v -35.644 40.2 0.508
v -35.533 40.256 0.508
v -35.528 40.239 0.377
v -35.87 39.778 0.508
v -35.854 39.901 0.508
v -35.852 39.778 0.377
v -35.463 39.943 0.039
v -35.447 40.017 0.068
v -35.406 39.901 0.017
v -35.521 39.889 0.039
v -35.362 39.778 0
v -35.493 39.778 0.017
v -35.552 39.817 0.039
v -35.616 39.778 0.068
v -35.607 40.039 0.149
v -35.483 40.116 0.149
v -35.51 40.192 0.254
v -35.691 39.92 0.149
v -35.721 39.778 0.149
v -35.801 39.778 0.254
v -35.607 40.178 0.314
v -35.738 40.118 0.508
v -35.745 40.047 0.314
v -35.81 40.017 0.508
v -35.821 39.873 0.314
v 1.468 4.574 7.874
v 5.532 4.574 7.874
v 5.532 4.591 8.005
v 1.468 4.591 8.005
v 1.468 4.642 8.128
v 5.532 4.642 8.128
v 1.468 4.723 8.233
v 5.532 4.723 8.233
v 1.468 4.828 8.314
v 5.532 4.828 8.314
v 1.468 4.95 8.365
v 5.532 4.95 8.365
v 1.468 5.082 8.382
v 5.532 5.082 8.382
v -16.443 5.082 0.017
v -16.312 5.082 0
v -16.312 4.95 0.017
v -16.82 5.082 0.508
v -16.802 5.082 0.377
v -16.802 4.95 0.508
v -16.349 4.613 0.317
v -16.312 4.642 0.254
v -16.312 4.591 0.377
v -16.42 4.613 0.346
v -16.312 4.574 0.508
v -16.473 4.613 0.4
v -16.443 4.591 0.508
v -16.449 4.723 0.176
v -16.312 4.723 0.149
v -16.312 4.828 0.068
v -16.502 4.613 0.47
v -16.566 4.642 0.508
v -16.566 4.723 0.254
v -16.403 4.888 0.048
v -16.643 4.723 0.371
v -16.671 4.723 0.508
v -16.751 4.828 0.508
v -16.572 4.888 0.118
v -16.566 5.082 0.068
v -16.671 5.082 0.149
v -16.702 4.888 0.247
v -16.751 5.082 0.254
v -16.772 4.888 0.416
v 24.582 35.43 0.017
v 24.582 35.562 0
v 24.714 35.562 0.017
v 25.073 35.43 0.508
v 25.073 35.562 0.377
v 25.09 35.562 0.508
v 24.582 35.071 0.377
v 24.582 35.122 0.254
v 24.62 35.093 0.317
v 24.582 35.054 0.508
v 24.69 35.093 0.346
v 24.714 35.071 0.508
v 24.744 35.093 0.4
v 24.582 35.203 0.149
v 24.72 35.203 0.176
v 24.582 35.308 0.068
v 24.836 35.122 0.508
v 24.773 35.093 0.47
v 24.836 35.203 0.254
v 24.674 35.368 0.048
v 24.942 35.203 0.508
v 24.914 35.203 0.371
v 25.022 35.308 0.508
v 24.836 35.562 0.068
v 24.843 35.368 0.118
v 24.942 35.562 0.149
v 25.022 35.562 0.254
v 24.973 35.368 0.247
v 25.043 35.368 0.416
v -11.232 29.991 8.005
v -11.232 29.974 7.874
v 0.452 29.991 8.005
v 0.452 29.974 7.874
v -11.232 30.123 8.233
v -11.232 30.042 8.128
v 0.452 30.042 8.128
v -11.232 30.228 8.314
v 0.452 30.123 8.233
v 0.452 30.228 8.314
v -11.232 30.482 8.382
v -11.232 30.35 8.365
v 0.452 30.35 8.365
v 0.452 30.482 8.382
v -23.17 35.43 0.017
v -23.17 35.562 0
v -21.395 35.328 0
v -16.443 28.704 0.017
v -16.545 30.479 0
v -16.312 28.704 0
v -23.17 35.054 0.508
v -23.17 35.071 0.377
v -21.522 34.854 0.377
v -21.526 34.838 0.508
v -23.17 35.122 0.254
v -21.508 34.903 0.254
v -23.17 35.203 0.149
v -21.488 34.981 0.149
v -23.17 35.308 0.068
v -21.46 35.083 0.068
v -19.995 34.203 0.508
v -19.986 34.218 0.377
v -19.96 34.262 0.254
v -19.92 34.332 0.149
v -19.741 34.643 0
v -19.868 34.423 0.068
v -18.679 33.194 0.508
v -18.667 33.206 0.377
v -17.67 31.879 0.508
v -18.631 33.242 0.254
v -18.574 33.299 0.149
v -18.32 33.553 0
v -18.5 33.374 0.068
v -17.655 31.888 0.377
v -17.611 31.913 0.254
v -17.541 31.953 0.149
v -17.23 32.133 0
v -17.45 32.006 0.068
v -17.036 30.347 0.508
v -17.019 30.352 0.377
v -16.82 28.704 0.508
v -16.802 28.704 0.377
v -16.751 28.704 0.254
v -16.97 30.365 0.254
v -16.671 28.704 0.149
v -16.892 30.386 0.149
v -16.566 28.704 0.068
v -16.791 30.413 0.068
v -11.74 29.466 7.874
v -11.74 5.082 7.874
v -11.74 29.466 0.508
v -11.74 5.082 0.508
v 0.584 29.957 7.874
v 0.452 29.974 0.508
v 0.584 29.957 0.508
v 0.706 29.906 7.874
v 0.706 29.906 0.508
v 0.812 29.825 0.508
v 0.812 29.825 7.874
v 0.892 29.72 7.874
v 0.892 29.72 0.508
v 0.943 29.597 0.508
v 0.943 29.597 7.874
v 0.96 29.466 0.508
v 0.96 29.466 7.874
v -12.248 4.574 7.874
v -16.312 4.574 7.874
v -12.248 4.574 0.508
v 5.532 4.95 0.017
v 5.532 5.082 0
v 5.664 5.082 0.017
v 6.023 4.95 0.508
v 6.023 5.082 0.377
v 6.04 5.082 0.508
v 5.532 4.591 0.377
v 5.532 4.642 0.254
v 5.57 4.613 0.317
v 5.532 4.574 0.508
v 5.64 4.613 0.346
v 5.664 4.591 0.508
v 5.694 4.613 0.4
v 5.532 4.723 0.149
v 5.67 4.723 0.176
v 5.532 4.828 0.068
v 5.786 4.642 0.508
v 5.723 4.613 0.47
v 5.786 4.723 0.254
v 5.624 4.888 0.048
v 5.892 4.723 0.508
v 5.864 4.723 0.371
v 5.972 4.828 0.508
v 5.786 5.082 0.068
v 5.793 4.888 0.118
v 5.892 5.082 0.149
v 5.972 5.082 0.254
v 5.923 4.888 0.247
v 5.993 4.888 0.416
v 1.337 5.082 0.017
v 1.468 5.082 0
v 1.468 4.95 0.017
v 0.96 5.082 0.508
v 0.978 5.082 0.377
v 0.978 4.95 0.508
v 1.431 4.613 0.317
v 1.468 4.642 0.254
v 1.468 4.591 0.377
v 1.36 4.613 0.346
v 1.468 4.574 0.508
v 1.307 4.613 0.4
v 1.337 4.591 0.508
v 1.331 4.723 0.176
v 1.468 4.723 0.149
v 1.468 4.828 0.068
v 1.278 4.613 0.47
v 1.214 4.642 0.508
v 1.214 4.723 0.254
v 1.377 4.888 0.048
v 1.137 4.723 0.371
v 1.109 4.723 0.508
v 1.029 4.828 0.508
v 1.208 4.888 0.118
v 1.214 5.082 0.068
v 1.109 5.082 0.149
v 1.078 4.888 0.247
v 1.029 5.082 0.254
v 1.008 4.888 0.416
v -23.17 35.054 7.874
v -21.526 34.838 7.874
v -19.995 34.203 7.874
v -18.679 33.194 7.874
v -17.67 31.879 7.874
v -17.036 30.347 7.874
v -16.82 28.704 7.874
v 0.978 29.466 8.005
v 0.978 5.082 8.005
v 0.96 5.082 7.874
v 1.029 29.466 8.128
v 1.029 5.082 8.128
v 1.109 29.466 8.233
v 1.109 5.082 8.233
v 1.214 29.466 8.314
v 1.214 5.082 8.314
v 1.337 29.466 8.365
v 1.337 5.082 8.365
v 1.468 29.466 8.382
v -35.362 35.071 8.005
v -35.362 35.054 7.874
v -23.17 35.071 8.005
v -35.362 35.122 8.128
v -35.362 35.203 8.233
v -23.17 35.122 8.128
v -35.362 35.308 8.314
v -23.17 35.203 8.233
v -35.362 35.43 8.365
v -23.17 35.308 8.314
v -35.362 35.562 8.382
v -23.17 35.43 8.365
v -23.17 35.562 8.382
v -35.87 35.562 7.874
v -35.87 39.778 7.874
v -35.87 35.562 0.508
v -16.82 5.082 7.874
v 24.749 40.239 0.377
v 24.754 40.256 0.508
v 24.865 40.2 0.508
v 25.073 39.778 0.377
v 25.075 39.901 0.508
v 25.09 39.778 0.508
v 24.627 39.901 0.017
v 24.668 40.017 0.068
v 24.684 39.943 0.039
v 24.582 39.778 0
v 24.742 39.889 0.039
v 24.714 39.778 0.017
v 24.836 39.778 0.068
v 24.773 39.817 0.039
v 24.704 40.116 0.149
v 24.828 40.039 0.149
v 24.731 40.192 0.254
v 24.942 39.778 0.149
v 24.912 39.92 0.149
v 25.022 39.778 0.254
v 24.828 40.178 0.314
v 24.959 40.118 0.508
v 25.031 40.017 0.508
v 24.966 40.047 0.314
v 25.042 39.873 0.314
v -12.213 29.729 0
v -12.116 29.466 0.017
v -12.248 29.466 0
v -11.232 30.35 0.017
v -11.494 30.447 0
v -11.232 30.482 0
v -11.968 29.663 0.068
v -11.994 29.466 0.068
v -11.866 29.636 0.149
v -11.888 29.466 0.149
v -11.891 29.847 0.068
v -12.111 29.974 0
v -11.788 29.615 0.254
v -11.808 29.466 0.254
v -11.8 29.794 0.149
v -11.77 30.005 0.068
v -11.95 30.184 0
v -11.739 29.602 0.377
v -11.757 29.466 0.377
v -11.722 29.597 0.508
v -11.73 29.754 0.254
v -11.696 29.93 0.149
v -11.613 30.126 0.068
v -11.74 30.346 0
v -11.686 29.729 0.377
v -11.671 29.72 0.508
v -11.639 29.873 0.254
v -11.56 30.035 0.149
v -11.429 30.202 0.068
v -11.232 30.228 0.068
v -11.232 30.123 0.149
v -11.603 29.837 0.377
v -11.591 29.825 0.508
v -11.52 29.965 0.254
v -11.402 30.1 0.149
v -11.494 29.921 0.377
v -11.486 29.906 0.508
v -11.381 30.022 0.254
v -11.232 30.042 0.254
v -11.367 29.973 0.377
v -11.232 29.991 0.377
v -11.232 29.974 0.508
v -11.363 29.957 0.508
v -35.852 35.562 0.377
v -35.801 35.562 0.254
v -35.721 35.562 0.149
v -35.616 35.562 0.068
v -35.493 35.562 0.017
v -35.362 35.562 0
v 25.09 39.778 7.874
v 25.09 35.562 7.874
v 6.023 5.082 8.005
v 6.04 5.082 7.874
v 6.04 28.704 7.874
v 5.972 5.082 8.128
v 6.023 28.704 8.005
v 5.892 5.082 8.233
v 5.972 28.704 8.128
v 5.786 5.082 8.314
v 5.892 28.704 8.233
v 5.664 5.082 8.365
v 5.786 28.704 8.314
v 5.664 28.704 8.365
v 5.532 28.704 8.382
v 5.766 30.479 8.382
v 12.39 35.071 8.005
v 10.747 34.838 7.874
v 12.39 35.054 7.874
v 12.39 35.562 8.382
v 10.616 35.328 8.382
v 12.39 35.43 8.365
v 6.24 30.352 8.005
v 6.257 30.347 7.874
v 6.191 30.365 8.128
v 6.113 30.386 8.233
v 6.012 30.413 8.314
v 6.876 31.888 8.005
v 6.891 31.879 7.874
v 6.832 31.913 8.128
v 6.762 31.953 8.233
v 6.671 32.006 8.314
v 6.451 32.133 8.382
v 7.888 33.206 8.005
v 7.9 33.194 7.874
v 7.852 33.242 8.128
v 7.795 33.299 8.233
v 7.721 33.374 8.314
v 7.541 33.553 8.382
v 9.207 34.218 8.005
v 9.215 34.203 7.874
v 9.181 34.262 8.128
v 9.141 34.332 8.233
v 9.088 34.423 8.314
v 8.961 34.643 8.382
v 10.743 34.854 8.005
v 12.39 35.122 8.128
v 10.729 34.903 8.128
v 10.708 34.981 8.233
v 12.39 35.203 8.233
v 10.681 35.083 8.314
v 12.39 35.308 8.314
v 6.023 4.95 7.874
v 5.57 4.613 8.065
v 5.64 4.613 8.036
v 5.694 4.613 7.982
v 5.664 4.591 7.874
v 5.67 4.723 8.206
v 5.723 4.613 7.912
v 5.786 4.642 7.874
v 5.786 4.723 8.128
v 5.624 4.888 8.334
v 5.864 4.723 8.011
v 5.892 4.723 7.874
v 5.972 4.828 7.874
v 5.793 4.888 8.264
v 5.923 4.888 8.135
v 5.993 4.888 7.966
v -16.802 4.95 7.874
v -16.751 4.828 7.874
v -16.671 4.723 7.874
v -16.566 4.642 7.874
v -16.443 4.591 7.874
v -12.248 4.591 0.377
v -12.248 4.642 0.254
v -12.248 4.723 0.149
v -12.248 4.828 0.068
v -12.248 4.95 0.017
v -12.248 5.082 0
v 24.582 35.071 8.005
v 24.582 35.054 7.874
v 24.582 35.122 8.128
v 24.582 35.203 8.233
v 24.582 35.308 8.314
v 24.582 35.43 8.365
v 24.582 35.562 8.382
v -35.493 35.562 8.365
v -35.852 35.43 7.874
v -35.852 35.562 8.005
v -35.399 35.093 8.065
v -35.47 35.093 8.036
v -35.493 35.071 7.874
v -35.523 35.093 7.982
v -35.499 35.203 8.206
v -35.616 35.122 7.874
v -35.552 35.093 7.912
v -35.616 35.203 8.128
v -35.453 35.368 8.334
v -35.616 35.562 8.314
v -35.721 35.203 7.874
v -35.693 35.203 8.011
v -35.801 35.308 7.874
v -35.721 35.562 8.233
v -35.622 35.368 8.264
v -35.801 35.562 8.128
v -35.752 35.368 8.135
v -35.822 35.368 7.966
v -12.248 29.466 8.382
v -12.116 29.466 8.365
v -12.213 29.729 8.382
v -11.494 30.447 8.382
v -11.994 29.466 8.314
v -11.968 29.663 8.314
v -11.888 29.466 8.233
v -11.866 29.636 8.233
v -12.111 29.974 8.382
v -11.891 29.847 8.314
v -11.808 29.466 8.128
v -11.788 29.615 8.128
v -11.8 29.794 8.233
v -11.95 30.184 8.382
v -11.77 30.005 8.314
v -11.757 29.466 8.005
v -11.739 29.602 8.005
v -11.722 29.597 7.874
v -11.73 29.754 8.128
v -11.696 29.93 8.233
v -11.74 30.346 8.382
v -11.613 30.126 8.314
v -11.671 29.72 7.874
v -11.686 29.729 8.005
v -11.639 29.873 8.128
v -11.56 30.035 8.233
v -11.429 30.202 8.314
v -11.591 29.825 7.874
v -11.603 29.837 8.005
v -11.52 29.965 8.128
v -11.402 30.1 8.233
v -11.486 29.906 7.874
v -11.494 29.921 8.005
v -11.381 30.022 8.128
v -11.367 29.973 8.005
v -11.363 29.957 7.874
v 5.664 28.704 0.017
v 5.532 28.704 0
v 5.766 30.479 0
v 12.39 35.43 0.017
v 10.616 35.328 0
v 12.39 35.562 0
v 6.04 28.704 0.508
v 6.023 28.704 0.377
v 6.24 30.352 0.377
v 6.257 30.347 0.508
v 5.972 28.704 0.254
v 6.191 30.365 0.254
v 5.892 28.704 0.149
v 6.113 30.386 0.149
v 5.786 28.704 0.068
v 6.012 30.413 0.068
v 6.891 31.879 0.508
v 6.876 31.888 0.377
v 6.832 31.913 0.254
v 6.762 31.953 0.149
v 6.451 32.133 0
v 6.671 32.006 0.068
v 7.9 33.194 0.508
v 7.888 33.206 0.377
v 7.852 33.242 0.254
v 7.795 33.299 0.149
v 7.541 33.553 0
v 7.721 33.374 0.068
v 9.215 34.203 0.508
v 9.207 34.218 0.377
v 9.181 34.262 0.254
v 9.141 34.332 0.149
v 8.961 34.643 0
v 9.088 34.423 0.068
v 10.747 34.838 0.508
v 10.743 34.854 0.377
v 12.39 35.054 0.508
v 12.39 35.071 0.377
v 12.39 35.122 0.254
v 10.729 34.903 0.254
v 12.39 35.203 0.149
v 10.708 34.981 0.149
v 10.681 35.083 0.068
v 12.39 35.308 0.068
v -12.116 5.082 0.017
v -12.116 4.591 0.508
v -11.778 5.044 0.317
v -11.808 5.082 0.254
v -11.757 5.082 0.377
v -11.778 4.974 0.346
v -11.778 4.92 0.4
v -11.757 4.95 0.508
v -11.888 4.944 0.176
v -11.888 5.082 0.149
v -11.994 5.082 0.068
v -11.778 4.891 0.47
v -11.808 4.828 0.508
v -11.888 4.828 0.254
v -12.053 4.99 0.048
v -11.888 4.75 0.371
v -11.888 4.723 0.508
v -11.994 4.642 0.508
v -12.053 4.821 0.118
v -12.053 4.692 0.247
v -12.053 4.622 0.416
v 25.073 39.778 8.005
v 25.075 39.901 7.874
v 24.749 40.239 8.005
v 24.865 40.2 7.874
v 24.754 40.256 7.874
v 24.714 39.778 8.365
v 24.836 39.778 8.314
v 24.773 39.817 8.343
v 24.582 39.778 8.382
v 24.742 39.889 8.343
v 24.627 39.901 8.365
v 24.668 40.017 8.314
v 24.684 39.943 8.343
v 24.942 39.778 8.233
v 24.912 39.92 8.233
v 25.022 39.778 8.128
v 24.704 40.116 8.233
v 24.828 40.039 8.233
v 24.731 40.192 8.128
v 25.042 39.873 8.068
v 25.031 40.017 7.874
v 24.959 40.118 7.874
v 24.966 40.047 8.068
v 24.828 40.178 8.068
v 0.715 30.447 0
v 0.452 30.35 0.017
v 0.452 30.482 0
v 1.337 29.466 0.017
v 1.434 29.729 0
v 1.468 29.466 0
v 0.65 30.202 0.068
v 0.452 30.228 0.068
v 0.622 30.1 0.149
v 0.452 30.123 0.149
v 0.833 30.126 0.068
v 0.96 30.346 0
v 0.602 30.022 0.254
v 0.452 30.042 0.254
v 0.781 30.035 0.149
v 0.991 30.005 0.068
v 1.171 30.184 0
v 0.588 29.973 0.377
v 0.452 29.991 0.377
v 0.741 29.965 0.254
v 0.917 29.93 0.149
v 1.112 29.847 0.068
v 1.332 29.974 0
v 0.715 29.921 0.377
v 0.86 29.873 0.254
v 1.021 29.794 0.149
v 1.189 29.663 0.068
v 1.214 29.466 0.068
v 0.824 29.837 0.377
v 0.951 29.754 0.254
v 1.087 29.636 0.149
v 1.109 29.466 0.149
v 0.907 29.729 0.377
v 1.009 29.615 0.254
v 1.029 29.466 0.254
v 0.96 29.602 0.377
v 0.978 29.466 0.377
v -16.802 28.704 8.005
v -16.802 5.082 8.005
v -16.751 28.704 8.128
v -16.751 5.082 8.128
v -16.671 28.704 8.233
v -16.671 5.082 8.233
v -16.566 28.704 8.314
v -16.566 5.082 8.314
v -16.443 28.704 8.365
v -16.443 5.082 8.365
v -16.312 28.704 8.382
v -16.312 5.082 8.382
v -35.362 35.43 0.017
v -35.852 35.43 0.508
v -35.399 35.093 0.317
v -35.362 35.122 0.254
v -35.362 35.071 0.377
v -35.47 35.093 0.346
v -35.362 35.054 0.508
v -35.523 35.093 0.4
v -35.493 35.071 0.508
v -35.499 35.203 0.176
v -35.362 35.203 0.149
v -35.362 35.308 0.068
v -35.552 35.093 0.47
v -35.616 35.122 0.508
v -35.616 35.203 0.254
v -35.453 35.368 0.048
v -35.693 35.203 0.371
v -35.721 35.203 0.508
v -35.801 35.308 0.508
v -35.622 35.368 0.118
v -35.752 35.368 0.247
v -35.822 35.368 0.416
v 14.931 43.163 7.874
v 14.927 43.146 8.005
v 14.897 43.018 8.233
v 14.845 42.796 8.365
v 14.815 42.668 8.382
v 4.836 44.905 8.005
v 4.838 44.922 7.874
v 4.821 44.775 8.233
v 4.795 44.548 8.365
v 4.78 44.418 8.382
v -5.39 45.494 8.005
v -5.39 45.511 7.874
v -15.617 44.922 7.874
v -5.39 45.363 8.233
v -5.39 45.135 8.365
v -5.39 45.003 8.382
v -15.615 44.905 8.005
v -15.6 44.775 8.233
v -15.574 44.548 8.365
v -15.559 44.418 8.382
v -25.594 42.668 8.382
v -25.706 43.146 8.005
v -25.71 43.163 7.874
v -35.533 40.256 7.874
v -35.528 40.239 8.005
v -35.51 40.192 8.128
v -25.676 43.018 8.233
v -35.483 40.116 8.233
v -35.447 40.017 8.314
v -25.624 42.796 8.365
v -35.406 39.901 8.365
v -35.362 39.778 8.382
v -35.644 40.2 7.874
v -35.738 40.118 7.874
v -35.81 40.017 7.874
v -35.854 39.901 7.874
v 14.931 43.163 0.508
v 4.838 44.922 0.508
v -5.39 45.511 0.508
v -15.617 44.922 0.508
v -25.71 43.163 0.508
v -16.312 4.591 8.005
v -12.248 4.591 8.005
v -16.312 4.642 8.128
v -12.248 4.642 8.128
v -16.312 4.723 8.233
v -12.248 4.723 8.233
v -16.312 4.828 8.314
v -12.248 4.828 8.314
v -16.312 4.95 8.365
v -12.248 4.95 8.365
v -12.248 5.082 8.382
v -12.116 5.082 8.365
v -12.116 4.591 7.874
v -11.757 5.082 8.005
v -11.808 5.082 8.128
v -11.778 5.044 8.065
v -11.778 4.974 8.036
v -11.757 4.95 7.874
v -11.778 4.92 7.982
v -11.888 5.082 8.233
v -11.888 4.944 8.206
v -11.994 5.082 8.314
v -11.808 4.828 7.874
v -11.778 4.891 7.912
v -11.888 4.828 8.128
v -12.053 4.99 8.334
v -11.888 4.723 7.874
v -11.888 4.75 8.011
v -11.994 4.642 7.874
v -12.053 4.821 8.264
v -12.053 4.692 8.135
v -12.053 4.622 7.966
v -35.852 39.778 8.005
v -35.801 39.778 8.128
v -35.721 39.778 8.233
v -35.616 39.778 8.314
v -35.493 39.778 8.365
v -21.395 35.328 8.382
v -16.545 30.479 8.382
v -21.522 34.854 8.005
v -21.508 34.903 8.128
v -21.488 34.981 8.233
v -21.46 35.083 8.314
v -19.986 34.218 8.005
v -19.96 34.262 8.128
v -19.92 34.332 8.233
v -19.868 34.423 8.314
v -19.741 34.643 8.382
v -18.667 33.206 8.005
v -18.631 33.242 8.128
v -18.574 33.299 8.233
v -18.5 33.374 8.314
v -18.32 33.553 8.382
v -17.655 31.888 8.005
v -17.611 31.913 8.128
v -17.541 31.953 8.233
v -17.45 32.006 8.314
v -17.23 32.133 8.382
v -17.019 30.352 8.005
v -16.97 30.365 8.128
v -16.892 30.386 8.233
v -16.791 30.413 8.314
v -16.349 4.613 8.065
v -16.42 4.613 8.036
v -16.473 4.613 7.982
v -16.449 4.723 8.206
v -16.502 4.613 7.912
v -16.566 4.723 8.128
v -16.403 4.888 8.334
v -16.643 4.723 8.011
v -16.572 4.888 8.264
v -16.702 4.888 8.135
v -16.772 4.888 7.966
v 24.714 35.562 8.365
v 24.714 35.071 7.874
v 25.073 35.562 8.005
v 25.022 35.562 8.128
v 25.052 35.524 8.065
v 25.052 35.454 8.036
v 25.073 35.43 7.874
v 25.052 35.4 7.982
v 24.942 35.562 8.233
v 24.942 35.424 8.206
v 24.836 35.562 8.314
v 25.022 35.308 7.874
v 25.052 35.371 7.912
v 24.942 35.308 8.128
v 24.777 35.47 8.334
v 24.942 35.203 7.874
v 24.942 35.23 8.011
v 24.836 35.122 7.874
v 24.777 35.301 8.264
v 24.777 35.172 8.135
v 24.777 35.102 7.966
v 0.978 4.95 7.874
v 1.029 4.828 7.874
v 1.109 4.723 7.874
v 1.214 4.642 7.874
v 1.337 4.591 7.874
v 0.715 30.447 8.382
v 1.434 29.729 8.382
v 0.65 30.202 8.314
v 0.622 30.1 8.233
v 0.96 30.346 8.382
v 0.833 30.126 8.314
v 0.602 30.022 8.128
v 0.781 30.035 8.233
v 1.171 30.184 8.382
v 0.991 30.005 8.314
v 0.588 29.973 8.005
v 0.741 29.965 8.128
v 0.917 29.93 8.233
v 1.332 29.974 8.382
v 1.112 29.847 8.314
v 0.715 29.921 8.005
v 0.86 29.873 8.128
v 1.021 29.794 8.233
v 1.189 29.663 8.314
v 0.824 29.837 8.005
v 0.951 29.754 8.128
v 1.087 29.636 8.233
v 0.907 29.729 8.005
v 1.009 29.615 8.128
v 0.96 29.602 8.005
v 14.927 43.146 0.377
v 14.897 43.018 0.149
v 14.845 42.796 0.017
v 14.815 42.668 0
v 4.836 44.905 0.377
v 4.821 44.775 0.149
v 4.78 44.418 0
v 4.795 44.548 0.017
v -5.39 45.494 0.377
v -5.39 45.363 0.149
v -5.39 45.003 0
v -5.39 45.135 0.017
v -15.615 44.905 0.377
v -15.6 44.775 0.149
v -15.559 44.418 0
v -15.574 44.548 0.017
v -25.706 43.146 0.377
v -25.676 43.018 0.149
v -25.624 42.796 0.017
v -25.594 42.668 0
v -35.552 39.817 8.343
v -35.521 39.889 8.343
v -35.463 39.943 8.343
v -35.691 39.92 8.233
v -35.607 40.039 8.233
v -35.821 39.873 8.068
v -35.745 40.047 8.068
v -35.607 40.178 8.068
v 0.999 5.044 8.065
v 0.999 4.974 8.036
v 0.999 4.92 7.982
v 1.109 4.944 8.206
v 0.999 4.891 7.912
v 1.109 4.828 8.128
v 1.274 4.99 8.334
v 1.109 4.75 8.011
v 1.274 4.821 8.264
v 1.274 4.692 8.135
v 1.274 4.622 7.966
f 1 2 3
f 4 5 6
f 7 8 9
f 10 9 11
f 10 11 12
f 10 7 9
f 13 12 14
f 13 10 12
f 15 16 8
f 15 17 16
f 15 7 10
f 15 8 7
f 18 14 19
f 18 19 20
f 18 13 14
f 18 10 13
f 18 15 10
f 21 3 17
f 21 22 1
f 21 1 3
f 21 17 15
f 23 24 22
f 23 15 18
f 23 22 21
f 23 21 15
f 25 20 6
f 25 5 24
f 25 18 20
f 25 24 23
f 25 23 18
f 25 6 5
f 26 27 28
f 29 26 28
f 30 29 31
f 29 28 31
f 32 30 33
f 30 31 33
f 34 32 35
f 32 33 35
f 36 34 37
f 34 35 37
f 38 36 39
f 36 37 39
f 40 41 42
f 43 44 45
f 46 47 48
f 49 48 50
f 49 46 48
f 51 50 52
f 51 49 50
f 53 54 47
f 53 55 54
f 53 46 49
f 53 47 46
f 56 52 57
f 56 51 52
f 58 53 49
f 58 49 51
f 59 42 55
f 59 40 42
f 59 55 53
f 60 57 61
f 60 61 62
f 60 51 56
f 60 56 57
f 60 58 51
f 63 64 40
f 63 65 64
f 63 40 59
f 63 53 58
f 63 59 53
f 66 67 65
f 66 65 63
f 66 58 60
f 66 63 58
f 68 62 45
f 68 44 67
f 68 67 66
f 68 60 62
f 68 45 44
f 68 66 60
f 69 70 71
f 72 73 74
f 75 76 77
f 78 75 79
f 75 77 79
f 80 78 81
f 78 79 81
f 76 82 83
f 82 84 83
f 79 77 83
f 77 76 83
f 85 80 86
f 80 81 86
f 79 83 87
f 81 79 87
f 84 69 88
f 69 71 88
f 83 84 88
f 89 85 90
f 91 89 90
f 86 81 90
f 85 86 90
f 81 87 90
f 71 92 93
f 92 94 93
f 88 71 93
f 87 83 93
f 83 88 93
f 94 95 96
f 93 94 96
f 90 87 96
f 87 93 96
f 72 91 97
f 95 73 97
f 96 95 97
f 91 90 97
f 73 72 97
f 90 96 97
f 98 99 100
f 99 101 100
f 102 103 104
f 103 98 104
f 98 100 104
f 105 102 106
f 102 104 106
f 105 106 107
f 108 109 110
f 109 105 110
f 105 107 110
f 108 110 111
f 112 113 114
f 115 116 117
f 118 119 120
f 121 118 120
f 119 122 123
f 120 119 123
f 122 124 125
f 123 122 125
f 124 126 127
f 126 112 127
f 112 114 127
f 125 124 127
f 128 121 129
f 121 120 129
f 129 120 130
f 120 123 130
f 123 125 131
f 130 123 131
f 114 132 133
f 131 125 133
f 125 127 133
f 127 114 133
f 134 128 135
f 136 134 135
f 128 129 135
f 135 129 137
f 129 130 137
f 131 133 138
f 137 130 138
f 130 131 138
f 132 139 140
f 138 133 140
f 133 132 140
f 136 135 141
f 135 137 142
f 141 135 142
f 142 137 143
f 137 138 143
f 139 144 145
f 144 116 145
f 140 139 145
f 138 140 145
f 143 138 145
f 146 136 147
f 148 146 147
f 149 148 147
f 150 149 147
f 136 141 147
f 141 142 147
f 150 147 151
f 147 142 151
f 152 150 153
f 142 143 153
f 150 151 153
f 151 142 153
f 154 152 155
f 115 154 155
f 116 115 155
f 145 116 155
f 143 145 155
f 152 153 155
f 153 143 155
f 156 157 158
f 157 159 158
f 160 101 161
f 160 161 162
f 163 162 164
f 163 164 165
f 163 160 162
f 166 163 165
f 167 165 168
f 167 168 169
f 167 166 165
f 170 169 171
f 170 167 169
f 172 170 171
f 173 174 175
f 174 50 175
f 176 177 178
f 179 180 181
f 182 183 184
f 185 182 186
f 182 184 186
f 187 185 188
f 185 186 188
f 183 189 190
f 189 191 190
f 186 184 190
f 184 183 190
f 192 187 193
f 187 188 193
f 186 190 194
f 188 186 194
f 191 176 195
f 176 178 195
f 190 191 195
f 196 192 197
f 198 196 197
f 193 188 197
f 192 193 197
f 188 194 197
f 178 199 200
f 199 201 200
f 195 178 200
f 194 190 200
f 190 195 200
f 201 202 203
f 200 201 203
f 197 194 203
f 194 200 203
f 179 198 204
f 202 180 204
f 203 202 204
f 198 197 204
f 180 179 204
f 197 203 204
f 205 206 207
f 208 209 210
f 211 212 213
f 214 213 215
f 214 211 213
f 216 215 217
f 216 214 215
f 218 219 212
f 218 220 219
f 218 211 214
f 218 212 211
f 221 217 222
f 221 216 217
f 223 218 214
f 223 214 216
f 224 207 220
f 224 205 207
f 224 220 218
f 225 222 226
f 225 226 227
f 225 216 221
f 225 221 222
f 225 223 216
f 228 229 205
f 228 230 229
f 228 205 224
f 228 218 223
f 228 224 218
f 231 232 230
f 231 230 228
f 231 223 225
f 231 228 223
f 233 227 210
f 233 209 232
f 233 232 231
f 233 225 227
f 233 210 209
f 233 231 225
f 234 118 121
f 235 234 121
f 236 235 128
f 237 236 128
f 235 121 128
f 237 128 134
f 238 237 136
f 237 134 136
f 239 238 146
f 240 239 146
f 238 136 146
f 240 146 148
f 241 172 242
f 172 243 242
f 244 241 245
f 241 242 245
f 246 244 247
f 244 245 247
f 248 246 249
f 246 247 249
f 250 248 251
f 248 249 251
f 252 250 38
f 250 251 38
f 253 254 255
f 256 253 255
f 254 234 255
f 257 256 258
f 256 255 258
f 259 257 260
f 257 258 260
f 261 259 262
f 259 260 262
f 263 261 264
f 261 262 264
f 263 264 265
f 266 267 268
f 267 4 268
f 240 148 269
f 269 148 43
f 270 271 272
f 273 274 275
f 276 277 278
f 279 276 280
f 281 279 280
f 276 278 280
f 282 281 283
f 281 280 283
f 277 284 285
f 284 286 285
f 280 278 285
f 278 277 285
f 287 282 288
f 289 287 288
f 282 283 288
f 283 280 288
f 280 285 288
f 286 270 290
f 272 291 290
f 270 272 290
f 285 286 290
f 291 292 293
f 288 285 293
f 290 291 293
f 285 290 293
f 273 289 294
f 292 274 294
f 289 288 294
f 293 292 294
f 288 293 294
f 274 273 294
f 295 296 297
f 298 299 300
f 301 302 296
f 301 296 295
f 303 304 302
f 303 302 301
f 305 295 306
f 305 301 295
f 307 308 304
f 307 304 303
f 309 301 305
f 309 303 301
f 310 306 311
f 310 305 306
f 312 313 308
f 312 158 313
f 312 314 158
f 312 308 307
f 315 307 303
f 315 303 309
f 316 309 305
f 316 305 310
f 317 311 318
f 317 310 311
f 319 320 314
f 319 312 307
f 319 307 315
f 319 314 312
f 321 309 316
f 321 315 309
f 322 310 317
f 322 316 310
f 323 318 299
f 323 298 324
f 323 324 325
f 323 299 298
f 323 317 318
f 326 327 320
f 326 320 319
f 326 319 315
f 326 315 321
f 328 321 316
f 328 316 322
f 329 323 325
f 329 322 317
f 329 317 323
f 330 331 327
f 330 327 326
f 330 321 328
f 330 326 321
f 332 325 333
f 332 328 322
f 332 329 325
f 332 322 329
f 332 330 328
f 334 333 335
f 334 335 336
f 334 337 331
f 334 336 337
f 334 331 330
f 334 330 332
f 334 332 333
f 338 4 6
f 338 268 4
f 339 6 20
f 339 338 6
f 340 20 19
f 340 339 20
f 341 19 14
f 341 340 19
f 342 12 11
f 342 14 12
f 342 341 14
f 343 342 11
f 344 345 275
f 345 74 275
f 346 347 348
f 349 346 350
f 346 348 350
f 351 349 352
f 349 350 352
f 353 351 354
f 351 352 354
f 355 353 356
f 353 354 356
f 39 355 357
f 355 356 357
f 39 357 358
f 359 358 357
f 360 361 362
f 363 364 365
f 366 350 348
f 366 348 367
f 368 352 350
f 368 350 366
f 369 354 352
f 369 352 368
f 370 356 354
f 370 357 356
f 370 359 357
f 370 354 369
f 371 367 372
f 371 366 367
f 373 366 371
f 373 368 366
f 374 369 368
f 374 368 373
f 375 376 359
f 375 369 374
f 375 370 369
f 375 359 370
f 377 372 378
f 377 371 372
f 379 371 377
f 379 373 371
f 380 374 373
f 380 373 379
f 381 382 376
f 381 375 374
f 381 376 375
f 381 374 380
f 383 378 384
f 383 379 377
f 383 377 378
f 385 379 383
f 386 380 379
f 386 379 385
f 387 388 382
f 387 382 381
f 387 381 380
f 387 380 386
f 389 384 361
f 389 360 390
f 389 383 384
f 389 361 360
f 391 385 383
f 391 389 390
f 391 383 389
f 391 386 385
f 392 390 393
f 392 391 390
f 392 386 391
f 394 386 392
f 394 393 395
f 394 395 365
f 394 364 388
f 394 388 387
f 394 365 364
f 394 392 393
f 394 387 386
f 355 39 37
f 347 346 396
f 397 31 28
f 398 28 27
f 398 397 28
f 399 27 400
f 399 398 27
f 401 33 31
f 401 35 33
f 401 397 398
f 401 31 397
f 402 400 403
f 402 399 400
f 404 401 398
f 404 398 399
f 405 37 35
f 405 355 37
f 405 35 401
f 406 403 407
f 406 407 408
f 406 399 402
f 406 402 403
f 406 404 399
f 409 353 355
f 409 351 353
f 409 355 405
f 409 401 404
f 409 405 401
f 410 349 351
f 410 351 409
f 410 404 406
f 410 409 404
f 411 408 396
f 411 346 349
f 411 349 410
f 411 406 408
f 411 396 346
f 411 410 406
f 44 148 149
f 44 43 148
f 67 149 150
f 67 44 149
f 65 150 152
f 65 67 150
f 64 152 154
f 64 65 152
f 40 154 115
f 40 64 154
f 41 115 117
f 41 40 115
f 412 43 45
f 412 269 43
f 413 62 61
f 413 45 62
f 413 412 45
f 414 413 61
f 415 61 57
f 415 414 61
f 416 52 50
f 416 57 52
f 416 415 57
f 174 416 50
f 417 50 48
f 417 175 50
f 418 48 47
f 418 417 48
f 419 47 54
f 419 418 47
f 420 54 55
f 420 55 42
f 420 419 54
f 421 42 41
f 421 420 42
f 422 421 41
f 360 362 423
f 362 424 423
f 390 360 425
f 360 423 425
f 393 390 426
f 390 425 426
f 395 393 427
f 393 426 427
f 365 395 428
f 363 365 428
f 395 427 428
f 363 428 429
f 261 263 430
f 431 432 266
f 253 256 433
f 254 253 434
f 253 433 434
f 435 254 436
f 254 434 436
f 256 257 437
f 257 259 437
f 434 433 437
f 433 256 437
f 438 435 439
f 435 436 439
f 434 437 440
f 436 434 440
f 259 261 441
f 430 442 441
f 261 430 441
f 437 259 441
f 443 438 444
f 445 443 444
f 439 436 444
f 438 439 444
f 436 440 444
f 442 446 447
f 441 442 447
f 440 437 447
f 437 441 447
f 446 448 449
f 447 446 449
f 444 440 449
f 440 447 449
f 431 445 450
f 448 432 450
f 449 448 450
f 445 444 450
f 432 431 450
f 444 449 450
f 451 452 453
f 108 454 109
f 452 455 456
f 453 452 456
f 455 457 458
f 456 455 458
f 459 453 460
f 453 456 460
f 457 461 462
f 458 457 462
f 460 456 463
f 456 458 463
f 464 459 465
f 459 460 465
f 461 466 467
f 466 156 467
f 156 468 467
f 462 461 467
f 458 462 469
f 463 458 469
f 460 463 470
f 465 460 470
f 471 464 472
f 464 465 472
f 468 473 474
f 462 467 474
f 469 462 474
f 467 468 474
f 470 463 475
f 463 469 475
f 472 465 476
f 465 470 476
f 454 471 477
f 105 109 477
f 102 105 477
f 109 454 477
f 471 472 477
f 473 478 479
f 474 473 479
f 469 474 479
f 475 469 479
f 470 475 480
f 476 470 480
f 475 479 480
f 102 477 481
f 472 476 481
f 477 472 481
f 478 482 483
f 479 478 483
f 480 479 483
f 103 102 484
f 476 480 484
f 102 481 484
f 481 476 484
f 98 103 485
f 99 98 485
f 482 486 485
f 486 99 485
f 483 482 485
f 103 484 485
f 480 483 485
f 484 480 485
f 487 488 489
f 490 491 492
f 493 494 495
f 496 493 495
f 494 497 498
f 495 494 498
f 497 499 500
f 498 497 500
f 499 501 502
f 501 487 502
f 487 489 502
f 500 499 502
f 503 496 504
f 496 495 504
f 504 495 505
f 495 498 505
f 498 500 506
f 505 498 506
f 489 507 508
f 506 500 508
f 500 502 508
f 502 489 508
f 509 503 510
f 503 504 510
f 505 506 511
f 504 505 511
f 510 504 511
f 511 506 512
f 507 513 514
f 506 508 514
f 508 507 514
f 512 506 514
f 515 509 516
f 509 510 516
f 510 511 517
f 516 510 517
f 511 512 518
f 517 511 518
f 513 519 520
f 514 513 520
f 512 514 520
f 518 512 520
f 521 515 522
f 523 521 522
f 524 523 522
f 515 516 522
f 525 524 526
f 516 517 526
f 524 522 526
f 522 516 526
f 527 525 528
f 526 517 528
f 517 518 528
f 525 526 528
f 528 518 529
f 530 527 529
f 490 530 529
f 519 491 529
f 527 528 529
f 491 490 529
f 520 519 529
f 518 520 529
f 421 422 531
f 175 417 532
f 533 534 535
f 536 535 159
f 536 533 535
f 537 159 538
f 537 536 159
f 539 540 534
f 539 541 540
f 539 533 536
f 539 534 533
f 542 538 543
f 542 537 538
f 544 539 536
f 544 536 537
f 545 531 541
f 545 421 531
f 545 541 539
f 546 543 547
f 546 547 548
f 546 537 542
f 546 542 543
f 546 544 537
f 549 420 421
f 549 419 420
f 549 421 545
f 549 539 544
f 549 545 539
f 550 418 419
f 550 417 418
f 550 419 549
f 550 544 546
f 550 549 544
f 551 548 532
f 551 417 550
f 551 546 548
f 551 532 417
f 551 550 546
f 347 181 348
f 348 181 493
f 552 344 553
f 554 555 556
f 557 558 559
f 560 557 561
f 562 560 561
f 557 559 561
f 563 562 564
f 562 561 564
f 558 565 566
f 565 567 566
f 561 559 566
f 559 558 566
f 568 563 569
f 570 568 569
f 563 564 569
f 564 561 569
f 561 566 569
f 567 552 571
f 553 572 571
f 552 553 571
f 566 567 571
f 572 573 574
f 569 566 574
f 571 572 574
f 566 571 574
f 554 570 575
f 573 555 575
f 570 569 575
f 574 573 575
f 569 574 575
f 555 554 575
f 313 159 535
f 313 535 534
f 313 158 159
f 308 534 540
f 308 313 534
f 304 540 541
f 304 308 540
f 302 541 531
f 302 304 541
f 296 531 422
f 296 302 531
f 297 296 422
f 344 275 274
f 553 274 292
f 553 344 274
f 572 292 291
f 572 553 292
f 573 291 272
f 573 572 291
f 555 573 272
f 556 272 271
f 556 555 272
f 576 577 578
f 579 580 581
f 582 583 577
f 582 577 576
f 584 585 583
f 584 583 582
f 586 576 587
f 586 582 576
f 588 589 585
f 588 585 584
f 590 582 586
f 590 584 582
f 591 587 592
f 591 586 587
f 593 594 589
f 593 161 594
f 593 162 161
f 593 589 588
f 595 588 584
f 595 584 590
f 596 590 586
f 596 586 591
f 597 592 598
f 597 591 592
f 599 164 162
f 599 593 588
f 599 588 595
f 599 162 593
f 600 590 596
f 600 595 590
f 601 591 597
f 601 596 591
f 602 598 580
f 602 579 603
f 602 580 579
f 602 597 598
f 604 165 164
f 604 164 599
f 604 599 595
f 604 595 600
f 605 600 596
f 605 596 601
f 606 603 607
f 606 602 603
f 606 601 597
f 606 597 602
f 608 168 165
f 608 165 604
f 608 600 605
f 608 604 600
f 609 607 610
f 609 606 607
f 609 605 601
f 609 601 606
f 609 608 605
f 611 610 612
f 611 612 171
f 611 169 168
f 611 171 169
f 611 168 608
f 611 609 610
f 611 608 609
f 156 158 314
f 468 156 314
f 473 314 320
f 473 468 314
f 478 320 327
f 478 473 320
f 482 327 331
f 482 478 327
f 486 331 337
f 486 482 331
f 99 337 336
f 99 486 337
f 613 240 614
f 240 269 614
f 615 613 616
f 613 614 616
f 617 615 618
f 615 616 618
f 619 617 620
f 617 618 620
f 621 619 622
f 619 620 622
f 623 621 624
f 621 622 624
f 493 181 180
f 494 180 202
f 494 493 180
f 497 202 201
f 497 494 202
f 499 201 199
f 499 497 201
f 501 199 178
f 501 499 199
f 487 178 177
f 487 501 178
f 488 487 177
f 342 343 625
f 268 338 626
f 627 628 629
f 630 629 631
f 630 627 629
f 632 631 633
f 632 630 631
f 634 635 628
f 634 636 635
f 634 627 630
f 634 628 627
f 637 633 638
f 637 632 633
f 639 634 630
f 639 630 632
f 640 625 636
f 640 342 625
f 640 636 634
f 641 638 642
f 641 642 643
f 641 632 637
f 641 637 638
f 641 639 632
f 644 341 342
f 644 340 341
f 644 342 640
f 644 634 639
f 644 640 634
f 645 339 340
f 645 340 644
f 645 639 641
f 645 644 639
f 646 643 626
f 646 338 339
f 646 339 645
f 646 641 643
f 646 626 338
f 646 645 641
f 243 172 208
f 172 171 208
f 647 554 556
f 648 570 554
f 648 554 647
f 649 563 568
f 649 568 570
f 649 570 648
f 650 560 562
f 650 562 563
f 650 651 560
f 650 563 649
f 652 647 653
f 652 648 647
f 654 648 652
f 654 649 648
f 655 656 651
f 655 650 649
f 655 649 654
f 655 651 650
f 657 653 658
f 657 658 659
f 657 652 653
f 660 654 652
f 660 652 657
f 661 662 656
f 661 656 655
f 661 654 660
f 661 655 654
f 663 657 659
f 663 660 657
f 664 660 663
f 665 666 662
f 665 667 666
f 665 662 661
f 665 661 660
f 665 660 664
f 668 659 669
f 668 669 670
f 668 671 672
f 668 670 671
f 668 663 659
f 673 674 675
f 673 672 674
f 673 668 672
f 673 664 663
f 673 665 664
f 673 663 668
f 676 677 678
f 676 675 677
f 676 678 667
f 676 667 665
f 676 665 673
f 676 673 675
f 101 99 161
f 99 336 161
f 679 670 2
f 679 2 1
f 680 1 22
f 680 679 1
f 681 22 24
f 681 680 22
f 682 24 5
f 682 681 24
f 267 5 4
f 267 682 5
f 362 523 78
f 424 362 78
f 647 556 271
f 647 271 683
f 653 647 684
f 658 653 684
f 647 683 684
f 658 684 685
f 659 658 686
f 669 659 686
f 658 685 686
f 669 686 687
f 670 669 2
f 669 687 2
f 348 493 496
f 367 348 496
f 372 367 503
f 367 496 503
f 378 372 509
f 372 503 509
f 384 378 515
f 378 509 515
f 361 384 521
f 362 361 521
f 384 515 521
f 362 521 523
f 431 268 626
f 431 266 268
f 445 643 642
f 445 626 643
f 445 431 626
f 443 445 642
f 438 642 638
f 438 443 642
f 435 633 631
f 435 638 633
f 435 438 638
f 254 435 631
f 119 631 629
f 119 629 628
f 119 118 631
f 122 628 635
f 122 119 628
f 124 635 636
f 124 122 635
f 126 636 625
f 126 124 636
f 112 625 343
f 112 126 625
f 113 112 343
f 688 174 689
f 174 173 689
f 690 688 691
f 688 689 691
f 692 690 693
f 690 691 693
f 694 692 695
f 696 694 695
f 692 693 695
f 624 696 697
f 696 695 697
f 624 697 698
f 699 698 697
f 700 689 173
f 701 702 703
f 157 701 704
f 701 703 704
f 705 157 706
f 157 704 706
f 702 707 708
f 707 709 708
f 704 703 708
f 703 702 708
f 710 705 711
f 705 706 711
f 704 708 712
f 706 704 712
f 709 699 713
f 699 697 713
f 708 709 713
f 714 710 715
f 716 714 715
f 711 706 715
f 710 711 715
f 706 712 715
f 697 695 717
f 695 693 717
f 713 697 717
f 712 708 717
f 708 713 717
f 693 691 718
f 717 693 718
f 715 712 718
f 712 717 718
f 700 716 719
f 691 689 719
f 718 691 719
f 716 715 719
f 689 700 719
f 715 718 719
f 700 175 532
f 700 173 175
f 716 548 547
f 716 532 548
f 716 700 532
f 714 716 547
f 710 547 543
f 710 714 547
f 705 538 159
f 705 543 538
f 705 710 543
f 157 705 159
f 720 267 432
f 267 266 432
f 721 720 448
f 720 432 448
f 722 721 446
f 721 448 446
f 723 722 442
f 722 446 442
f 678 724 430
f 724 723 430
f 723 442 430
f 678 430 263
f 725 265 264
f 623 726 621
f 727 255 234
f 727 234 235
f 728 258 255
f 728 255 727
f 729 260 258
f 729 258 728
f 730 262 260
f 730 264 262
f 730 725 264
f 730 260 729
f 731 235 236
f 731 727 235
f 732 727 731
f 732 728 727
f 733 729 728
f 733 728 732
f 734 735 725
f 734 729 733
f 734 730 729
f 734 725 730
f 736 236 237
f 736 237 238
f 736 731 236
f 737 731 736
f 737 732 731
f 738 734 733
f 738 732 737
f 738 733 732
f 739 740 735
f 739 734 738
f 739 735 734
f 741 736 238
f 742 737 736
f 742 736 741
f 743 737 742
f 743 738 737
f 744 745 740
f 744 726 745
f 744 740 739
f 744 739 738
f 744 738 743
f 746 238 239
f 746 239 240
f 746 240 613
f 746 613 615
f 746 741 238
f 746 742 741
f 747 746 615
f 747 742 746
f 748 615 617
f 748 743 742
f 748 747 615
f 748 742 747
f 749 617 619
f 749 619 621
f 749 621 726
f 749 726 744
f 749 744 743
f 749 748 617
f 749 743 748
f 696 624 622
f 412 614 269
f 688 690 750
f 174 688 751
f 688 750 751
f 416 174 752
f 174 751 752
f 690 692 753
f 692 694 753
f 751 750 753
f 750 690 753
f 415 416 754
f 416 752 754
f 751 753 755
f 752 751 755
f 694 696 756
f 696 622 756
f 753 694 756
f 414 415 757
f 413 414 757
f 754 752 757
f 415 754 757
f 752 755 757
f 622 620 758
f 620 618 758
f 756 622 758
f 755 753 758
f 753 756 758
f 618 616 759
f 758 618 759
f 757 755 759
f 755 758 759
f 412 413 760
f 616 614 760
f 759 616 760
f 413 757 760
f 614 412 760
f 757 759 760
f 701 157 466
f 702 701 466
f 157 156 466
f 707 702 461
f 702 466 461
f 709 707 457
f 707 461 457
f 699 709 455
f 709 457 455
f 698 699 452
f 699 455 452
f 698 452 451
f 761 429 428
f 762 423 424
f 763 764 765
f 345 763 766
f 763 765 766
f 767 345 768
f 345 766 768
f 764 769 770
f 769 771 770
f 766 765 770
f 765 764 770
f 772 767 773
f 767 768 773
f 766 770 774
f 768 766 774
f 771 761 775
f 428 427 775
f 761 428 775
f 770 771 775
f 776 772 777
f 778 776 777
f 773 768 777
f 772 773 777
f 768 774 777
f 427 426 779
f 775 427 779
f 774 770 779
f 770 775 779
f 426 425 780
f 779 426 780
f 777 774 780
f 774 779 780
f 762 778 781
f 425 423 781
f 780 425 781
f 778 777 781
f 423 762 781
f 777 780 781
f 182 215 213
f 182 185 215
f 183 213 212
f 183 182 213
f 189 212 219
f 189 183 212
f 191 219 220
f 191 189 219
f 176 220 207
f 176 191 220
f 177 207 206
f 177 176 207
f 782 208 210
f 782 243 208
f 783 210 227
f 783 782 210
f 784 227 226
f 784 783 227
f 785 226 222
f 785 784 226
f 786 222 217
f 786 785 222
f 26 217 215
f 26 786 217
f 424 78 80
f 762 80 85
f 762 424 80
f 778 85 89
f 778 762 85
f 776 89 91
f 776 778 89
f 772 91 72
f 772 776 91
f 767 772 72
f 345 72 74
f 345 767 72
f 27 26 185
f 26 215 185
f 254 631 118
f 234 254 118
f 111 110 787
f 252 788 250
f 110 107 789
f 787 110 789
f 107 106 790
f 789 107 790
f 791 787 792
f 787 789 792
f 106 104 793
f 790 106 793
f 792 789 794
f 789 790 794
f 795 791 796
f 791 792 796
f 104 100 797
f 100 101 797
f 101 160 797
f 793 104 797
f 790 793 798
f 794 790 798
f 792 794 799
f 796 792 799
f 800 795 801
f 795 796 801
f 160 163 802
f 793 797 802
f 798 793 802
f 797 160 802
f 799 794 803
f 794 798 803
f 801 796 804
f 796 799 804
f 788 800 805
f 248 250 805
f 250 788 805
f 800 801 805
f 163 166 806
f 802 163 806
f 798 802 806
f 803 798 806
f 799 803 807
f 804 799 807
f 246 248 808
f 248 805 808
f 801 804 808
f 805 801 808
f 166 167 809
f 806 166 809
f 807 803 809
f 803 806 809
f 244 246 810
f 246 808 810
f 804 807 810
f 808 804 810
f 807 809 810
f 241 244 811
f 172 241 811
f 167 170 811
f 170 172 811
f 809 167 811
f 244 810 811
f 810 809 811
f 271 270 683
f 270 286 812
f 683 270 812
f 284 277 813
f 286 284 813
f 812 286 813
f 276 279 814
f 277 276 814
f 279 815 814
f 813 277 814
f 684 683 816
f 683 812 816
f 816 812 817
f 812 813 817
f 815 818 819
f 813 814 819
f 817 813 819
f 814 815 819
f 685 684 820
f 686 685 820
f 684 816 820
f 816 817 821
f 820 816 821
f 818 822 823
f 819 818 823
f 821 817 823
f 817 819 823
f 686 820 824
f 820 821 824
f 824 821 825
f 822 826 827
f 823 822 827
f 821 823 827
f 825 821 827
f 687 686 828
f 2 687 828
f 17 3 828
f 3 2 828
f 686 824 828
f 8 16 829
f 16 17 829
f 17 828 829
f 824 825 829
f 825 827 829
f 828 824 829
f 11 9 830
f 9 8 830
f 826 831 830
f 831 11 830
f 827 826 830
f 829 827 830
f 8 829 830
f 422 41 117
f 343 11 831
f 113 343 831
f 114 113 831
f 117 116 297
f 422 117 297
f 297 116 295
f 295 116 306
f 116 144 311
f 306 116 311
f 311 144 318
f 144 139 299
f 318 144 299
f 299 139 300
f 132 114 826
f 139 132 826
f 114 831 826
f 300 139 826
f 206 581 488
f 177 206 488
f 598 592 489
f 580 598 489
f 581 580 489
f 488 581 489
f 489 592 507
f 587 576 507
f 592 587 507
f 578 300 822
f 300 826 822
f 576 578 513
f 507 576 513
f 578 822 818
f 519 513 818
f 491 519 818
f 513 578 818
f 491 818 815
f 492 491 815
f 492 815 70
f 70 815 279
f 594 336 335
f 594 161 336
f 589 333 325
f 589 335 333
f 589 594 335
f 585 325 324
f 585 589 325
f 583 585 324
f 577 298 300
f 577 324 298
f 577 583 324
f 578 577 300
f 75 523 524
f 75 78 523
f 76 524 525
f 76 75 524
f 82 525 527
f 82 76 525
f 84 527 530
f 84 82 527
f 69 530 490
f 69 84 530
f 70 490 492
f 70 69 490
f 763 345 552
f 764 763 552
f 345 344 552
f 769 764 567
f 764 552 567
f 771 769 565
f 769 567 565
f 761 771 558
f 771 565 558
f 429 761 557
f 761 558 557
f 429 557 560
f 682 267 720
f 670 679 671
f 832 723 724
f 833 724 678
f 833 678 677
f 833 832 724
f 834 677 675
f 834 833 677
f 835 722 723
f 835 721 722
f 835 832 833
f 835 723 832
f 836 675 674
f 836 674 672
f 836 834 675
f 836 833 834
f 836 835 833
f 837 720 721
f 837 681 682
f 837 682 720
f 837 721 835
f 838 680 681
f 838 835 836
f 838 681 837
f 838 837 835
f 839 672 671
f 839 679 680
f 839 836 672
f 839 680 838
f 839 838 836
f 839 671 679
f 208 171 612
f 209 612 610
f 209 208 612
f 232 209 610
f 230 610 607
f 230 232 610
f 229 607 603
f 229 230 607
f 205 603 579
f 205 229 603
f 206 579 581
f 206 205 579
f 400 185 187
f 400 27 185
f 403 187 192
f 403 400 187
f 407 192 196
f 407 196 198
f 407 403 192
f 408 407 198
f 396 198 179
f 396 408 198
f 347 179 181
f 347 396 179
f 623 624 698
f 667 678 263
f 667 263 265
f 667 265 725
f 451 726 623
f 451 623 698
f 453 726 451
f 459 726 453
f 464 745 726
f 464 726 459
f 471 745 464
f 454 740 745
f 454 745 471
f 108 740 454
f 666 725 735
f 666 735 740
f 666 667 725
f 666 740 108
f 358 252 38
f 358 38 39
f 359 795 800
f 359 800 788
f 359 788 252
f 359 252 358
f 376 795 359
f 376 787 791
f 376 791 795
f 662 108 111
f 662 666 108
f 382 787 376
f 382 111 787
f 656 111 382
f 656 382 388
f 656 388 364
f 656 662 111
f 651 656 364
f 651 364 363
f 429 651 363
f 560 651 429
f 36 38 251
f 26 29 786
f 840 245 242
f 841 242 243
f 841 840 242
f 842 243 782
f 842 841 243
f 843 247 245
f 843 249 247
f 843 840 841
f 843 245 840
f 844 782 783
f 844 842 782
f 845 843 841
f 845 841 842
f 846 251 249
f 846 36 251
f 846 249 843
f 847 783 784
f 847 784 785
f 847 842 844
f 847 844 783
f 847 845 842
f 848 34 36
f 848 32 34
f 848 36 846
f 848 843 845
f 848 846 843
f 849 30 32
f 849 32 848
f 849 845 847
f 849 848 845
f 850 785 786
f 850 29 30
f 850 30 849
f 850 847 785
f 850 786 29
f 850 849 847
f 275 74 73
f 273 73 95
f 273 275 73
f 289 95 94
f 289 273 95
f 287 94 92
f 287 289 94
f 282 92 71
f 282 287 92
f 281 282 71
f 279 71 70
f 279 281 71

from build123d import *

# Parameters (mm, degrees)
F1_DEPTH = 8.382
F2_R     = 0.508


with BuildPart() as f1:
    # F0 (on Top) → F1 (new body)
    with BuildSketch(Plane.XY):
        with BuildLine():
            Line((-16.819511, 28.70391), (-16.819511, 4.57391))
            Line((-16.819511, 4.57391), (-11.739511, 4.57391))
            Line((-11.739511, 4.57391), (-11.739511, 29.97391))
            Line((-11.739511, 29.97391), (0.960489, 29.97391))
            Line((0.960489, 29.97391), (0.960489, 4.57391))
            Line((0.960489, 4.57391), (6.040489, 4.57391))
            Line((6.040489, 4.57391), (6.040489, 28.70391))
            ThreePointArc((6.040489, 28.70391), (7.900361, 33.194038), (12.390489, 35.05391))
            Line((12.390489, 35.05391), (25.090489, 35.05391))
            Line((25.090489, 35.05391), (25.090489, 40.13391))
            ThreePointArc((25.090489, 40.13391), (-5.389511, 45.511487), (-35.869511, 40.13391))
            Line((-35.869511, 40.13391), (-35.869511, 35.05391))
            Line((-35.869511, 35.05391), (-23.169511, 35.05391))
            ThreePointArc((-23.169511, 35.05391), (-18.679383, 33.194038), (-16.819511, 28.70391))
        make_face()
    extrude(amount=F1_DEPTH)

    # F2
    f2_edges = [f1.edges().sort_by_distance(p)[0] for p in [
        (6.040489, 16.63891, 8.382),
        (3.500489, 4.57391, 8.382),
        (-35.869511, 37.59391, 8.382),
        (-29.519511, 35.05391, 8.382),
        (-18.679383, 33.194038, 8.382),
        (-16.819511, 16.63891, 8.382),
        (-14.279511, 4.57391, 8.382),
        (-11.739511, 17.27391, 8.382),
        (-5.389511, 29.97391, 8.382),
        (0.960489, 17.27391, 8.382),
        (7.900361, 33.194038, 8.382),
        (18.740489, 35.05391, 8.382),
        (25.090489, 37.59391, 8.382),
        (-5.389511, 45.511487, 8.382),
        (-5.389511, 45.511487, 0),
        (25.090489, 37.59391, 0),
        (18.740489, 35.05391, 0),
        (-35.869511, 37.59391, 0),
        (-29.519511, 35.05391, 0),
        (-18.679383, 33.194038, 0),
        (-16.819511, 16.63891, 0),
        (-14.279511, 4.57391, 0),
        (-11.739511, 17.27391, 0),
        (-5.389511, 29.97391, 0),
        (0.960489, 17.27391, 0),
        (3.500489, 4.57391, 0),
        (6.040489, 16.63891, 0),
        (7.900361, 33.194038, 0),
        (25.090489, 40.13391, 4.191),
        (-35.869511, 40.13391, 4.191),
        (12.390489, 35.05391, 4.191),
        (25.090489, 35.05391, 4.191),
        (6.040489, 4.57391, 4.191),
        (6.040489, 28.70391, 4.191),
        (0.960489, 29.97391, 4.191),
        (0.960489, 4.57391, 4.191),
        (-11.739511, 4.57391, 4.191),
        (-11.739511, 29.97391, 4.191),
        (-16.819511, 4.57391, 4.191),
        (-16.819511, 28.70391, 4.191),
        (-35.869511, 35.05391, 4.191),
        (-23.169511, 35.05391, 4.191),
    ]]
    fillet(f2_edges, radius=F2_R)


solid = f1.part
